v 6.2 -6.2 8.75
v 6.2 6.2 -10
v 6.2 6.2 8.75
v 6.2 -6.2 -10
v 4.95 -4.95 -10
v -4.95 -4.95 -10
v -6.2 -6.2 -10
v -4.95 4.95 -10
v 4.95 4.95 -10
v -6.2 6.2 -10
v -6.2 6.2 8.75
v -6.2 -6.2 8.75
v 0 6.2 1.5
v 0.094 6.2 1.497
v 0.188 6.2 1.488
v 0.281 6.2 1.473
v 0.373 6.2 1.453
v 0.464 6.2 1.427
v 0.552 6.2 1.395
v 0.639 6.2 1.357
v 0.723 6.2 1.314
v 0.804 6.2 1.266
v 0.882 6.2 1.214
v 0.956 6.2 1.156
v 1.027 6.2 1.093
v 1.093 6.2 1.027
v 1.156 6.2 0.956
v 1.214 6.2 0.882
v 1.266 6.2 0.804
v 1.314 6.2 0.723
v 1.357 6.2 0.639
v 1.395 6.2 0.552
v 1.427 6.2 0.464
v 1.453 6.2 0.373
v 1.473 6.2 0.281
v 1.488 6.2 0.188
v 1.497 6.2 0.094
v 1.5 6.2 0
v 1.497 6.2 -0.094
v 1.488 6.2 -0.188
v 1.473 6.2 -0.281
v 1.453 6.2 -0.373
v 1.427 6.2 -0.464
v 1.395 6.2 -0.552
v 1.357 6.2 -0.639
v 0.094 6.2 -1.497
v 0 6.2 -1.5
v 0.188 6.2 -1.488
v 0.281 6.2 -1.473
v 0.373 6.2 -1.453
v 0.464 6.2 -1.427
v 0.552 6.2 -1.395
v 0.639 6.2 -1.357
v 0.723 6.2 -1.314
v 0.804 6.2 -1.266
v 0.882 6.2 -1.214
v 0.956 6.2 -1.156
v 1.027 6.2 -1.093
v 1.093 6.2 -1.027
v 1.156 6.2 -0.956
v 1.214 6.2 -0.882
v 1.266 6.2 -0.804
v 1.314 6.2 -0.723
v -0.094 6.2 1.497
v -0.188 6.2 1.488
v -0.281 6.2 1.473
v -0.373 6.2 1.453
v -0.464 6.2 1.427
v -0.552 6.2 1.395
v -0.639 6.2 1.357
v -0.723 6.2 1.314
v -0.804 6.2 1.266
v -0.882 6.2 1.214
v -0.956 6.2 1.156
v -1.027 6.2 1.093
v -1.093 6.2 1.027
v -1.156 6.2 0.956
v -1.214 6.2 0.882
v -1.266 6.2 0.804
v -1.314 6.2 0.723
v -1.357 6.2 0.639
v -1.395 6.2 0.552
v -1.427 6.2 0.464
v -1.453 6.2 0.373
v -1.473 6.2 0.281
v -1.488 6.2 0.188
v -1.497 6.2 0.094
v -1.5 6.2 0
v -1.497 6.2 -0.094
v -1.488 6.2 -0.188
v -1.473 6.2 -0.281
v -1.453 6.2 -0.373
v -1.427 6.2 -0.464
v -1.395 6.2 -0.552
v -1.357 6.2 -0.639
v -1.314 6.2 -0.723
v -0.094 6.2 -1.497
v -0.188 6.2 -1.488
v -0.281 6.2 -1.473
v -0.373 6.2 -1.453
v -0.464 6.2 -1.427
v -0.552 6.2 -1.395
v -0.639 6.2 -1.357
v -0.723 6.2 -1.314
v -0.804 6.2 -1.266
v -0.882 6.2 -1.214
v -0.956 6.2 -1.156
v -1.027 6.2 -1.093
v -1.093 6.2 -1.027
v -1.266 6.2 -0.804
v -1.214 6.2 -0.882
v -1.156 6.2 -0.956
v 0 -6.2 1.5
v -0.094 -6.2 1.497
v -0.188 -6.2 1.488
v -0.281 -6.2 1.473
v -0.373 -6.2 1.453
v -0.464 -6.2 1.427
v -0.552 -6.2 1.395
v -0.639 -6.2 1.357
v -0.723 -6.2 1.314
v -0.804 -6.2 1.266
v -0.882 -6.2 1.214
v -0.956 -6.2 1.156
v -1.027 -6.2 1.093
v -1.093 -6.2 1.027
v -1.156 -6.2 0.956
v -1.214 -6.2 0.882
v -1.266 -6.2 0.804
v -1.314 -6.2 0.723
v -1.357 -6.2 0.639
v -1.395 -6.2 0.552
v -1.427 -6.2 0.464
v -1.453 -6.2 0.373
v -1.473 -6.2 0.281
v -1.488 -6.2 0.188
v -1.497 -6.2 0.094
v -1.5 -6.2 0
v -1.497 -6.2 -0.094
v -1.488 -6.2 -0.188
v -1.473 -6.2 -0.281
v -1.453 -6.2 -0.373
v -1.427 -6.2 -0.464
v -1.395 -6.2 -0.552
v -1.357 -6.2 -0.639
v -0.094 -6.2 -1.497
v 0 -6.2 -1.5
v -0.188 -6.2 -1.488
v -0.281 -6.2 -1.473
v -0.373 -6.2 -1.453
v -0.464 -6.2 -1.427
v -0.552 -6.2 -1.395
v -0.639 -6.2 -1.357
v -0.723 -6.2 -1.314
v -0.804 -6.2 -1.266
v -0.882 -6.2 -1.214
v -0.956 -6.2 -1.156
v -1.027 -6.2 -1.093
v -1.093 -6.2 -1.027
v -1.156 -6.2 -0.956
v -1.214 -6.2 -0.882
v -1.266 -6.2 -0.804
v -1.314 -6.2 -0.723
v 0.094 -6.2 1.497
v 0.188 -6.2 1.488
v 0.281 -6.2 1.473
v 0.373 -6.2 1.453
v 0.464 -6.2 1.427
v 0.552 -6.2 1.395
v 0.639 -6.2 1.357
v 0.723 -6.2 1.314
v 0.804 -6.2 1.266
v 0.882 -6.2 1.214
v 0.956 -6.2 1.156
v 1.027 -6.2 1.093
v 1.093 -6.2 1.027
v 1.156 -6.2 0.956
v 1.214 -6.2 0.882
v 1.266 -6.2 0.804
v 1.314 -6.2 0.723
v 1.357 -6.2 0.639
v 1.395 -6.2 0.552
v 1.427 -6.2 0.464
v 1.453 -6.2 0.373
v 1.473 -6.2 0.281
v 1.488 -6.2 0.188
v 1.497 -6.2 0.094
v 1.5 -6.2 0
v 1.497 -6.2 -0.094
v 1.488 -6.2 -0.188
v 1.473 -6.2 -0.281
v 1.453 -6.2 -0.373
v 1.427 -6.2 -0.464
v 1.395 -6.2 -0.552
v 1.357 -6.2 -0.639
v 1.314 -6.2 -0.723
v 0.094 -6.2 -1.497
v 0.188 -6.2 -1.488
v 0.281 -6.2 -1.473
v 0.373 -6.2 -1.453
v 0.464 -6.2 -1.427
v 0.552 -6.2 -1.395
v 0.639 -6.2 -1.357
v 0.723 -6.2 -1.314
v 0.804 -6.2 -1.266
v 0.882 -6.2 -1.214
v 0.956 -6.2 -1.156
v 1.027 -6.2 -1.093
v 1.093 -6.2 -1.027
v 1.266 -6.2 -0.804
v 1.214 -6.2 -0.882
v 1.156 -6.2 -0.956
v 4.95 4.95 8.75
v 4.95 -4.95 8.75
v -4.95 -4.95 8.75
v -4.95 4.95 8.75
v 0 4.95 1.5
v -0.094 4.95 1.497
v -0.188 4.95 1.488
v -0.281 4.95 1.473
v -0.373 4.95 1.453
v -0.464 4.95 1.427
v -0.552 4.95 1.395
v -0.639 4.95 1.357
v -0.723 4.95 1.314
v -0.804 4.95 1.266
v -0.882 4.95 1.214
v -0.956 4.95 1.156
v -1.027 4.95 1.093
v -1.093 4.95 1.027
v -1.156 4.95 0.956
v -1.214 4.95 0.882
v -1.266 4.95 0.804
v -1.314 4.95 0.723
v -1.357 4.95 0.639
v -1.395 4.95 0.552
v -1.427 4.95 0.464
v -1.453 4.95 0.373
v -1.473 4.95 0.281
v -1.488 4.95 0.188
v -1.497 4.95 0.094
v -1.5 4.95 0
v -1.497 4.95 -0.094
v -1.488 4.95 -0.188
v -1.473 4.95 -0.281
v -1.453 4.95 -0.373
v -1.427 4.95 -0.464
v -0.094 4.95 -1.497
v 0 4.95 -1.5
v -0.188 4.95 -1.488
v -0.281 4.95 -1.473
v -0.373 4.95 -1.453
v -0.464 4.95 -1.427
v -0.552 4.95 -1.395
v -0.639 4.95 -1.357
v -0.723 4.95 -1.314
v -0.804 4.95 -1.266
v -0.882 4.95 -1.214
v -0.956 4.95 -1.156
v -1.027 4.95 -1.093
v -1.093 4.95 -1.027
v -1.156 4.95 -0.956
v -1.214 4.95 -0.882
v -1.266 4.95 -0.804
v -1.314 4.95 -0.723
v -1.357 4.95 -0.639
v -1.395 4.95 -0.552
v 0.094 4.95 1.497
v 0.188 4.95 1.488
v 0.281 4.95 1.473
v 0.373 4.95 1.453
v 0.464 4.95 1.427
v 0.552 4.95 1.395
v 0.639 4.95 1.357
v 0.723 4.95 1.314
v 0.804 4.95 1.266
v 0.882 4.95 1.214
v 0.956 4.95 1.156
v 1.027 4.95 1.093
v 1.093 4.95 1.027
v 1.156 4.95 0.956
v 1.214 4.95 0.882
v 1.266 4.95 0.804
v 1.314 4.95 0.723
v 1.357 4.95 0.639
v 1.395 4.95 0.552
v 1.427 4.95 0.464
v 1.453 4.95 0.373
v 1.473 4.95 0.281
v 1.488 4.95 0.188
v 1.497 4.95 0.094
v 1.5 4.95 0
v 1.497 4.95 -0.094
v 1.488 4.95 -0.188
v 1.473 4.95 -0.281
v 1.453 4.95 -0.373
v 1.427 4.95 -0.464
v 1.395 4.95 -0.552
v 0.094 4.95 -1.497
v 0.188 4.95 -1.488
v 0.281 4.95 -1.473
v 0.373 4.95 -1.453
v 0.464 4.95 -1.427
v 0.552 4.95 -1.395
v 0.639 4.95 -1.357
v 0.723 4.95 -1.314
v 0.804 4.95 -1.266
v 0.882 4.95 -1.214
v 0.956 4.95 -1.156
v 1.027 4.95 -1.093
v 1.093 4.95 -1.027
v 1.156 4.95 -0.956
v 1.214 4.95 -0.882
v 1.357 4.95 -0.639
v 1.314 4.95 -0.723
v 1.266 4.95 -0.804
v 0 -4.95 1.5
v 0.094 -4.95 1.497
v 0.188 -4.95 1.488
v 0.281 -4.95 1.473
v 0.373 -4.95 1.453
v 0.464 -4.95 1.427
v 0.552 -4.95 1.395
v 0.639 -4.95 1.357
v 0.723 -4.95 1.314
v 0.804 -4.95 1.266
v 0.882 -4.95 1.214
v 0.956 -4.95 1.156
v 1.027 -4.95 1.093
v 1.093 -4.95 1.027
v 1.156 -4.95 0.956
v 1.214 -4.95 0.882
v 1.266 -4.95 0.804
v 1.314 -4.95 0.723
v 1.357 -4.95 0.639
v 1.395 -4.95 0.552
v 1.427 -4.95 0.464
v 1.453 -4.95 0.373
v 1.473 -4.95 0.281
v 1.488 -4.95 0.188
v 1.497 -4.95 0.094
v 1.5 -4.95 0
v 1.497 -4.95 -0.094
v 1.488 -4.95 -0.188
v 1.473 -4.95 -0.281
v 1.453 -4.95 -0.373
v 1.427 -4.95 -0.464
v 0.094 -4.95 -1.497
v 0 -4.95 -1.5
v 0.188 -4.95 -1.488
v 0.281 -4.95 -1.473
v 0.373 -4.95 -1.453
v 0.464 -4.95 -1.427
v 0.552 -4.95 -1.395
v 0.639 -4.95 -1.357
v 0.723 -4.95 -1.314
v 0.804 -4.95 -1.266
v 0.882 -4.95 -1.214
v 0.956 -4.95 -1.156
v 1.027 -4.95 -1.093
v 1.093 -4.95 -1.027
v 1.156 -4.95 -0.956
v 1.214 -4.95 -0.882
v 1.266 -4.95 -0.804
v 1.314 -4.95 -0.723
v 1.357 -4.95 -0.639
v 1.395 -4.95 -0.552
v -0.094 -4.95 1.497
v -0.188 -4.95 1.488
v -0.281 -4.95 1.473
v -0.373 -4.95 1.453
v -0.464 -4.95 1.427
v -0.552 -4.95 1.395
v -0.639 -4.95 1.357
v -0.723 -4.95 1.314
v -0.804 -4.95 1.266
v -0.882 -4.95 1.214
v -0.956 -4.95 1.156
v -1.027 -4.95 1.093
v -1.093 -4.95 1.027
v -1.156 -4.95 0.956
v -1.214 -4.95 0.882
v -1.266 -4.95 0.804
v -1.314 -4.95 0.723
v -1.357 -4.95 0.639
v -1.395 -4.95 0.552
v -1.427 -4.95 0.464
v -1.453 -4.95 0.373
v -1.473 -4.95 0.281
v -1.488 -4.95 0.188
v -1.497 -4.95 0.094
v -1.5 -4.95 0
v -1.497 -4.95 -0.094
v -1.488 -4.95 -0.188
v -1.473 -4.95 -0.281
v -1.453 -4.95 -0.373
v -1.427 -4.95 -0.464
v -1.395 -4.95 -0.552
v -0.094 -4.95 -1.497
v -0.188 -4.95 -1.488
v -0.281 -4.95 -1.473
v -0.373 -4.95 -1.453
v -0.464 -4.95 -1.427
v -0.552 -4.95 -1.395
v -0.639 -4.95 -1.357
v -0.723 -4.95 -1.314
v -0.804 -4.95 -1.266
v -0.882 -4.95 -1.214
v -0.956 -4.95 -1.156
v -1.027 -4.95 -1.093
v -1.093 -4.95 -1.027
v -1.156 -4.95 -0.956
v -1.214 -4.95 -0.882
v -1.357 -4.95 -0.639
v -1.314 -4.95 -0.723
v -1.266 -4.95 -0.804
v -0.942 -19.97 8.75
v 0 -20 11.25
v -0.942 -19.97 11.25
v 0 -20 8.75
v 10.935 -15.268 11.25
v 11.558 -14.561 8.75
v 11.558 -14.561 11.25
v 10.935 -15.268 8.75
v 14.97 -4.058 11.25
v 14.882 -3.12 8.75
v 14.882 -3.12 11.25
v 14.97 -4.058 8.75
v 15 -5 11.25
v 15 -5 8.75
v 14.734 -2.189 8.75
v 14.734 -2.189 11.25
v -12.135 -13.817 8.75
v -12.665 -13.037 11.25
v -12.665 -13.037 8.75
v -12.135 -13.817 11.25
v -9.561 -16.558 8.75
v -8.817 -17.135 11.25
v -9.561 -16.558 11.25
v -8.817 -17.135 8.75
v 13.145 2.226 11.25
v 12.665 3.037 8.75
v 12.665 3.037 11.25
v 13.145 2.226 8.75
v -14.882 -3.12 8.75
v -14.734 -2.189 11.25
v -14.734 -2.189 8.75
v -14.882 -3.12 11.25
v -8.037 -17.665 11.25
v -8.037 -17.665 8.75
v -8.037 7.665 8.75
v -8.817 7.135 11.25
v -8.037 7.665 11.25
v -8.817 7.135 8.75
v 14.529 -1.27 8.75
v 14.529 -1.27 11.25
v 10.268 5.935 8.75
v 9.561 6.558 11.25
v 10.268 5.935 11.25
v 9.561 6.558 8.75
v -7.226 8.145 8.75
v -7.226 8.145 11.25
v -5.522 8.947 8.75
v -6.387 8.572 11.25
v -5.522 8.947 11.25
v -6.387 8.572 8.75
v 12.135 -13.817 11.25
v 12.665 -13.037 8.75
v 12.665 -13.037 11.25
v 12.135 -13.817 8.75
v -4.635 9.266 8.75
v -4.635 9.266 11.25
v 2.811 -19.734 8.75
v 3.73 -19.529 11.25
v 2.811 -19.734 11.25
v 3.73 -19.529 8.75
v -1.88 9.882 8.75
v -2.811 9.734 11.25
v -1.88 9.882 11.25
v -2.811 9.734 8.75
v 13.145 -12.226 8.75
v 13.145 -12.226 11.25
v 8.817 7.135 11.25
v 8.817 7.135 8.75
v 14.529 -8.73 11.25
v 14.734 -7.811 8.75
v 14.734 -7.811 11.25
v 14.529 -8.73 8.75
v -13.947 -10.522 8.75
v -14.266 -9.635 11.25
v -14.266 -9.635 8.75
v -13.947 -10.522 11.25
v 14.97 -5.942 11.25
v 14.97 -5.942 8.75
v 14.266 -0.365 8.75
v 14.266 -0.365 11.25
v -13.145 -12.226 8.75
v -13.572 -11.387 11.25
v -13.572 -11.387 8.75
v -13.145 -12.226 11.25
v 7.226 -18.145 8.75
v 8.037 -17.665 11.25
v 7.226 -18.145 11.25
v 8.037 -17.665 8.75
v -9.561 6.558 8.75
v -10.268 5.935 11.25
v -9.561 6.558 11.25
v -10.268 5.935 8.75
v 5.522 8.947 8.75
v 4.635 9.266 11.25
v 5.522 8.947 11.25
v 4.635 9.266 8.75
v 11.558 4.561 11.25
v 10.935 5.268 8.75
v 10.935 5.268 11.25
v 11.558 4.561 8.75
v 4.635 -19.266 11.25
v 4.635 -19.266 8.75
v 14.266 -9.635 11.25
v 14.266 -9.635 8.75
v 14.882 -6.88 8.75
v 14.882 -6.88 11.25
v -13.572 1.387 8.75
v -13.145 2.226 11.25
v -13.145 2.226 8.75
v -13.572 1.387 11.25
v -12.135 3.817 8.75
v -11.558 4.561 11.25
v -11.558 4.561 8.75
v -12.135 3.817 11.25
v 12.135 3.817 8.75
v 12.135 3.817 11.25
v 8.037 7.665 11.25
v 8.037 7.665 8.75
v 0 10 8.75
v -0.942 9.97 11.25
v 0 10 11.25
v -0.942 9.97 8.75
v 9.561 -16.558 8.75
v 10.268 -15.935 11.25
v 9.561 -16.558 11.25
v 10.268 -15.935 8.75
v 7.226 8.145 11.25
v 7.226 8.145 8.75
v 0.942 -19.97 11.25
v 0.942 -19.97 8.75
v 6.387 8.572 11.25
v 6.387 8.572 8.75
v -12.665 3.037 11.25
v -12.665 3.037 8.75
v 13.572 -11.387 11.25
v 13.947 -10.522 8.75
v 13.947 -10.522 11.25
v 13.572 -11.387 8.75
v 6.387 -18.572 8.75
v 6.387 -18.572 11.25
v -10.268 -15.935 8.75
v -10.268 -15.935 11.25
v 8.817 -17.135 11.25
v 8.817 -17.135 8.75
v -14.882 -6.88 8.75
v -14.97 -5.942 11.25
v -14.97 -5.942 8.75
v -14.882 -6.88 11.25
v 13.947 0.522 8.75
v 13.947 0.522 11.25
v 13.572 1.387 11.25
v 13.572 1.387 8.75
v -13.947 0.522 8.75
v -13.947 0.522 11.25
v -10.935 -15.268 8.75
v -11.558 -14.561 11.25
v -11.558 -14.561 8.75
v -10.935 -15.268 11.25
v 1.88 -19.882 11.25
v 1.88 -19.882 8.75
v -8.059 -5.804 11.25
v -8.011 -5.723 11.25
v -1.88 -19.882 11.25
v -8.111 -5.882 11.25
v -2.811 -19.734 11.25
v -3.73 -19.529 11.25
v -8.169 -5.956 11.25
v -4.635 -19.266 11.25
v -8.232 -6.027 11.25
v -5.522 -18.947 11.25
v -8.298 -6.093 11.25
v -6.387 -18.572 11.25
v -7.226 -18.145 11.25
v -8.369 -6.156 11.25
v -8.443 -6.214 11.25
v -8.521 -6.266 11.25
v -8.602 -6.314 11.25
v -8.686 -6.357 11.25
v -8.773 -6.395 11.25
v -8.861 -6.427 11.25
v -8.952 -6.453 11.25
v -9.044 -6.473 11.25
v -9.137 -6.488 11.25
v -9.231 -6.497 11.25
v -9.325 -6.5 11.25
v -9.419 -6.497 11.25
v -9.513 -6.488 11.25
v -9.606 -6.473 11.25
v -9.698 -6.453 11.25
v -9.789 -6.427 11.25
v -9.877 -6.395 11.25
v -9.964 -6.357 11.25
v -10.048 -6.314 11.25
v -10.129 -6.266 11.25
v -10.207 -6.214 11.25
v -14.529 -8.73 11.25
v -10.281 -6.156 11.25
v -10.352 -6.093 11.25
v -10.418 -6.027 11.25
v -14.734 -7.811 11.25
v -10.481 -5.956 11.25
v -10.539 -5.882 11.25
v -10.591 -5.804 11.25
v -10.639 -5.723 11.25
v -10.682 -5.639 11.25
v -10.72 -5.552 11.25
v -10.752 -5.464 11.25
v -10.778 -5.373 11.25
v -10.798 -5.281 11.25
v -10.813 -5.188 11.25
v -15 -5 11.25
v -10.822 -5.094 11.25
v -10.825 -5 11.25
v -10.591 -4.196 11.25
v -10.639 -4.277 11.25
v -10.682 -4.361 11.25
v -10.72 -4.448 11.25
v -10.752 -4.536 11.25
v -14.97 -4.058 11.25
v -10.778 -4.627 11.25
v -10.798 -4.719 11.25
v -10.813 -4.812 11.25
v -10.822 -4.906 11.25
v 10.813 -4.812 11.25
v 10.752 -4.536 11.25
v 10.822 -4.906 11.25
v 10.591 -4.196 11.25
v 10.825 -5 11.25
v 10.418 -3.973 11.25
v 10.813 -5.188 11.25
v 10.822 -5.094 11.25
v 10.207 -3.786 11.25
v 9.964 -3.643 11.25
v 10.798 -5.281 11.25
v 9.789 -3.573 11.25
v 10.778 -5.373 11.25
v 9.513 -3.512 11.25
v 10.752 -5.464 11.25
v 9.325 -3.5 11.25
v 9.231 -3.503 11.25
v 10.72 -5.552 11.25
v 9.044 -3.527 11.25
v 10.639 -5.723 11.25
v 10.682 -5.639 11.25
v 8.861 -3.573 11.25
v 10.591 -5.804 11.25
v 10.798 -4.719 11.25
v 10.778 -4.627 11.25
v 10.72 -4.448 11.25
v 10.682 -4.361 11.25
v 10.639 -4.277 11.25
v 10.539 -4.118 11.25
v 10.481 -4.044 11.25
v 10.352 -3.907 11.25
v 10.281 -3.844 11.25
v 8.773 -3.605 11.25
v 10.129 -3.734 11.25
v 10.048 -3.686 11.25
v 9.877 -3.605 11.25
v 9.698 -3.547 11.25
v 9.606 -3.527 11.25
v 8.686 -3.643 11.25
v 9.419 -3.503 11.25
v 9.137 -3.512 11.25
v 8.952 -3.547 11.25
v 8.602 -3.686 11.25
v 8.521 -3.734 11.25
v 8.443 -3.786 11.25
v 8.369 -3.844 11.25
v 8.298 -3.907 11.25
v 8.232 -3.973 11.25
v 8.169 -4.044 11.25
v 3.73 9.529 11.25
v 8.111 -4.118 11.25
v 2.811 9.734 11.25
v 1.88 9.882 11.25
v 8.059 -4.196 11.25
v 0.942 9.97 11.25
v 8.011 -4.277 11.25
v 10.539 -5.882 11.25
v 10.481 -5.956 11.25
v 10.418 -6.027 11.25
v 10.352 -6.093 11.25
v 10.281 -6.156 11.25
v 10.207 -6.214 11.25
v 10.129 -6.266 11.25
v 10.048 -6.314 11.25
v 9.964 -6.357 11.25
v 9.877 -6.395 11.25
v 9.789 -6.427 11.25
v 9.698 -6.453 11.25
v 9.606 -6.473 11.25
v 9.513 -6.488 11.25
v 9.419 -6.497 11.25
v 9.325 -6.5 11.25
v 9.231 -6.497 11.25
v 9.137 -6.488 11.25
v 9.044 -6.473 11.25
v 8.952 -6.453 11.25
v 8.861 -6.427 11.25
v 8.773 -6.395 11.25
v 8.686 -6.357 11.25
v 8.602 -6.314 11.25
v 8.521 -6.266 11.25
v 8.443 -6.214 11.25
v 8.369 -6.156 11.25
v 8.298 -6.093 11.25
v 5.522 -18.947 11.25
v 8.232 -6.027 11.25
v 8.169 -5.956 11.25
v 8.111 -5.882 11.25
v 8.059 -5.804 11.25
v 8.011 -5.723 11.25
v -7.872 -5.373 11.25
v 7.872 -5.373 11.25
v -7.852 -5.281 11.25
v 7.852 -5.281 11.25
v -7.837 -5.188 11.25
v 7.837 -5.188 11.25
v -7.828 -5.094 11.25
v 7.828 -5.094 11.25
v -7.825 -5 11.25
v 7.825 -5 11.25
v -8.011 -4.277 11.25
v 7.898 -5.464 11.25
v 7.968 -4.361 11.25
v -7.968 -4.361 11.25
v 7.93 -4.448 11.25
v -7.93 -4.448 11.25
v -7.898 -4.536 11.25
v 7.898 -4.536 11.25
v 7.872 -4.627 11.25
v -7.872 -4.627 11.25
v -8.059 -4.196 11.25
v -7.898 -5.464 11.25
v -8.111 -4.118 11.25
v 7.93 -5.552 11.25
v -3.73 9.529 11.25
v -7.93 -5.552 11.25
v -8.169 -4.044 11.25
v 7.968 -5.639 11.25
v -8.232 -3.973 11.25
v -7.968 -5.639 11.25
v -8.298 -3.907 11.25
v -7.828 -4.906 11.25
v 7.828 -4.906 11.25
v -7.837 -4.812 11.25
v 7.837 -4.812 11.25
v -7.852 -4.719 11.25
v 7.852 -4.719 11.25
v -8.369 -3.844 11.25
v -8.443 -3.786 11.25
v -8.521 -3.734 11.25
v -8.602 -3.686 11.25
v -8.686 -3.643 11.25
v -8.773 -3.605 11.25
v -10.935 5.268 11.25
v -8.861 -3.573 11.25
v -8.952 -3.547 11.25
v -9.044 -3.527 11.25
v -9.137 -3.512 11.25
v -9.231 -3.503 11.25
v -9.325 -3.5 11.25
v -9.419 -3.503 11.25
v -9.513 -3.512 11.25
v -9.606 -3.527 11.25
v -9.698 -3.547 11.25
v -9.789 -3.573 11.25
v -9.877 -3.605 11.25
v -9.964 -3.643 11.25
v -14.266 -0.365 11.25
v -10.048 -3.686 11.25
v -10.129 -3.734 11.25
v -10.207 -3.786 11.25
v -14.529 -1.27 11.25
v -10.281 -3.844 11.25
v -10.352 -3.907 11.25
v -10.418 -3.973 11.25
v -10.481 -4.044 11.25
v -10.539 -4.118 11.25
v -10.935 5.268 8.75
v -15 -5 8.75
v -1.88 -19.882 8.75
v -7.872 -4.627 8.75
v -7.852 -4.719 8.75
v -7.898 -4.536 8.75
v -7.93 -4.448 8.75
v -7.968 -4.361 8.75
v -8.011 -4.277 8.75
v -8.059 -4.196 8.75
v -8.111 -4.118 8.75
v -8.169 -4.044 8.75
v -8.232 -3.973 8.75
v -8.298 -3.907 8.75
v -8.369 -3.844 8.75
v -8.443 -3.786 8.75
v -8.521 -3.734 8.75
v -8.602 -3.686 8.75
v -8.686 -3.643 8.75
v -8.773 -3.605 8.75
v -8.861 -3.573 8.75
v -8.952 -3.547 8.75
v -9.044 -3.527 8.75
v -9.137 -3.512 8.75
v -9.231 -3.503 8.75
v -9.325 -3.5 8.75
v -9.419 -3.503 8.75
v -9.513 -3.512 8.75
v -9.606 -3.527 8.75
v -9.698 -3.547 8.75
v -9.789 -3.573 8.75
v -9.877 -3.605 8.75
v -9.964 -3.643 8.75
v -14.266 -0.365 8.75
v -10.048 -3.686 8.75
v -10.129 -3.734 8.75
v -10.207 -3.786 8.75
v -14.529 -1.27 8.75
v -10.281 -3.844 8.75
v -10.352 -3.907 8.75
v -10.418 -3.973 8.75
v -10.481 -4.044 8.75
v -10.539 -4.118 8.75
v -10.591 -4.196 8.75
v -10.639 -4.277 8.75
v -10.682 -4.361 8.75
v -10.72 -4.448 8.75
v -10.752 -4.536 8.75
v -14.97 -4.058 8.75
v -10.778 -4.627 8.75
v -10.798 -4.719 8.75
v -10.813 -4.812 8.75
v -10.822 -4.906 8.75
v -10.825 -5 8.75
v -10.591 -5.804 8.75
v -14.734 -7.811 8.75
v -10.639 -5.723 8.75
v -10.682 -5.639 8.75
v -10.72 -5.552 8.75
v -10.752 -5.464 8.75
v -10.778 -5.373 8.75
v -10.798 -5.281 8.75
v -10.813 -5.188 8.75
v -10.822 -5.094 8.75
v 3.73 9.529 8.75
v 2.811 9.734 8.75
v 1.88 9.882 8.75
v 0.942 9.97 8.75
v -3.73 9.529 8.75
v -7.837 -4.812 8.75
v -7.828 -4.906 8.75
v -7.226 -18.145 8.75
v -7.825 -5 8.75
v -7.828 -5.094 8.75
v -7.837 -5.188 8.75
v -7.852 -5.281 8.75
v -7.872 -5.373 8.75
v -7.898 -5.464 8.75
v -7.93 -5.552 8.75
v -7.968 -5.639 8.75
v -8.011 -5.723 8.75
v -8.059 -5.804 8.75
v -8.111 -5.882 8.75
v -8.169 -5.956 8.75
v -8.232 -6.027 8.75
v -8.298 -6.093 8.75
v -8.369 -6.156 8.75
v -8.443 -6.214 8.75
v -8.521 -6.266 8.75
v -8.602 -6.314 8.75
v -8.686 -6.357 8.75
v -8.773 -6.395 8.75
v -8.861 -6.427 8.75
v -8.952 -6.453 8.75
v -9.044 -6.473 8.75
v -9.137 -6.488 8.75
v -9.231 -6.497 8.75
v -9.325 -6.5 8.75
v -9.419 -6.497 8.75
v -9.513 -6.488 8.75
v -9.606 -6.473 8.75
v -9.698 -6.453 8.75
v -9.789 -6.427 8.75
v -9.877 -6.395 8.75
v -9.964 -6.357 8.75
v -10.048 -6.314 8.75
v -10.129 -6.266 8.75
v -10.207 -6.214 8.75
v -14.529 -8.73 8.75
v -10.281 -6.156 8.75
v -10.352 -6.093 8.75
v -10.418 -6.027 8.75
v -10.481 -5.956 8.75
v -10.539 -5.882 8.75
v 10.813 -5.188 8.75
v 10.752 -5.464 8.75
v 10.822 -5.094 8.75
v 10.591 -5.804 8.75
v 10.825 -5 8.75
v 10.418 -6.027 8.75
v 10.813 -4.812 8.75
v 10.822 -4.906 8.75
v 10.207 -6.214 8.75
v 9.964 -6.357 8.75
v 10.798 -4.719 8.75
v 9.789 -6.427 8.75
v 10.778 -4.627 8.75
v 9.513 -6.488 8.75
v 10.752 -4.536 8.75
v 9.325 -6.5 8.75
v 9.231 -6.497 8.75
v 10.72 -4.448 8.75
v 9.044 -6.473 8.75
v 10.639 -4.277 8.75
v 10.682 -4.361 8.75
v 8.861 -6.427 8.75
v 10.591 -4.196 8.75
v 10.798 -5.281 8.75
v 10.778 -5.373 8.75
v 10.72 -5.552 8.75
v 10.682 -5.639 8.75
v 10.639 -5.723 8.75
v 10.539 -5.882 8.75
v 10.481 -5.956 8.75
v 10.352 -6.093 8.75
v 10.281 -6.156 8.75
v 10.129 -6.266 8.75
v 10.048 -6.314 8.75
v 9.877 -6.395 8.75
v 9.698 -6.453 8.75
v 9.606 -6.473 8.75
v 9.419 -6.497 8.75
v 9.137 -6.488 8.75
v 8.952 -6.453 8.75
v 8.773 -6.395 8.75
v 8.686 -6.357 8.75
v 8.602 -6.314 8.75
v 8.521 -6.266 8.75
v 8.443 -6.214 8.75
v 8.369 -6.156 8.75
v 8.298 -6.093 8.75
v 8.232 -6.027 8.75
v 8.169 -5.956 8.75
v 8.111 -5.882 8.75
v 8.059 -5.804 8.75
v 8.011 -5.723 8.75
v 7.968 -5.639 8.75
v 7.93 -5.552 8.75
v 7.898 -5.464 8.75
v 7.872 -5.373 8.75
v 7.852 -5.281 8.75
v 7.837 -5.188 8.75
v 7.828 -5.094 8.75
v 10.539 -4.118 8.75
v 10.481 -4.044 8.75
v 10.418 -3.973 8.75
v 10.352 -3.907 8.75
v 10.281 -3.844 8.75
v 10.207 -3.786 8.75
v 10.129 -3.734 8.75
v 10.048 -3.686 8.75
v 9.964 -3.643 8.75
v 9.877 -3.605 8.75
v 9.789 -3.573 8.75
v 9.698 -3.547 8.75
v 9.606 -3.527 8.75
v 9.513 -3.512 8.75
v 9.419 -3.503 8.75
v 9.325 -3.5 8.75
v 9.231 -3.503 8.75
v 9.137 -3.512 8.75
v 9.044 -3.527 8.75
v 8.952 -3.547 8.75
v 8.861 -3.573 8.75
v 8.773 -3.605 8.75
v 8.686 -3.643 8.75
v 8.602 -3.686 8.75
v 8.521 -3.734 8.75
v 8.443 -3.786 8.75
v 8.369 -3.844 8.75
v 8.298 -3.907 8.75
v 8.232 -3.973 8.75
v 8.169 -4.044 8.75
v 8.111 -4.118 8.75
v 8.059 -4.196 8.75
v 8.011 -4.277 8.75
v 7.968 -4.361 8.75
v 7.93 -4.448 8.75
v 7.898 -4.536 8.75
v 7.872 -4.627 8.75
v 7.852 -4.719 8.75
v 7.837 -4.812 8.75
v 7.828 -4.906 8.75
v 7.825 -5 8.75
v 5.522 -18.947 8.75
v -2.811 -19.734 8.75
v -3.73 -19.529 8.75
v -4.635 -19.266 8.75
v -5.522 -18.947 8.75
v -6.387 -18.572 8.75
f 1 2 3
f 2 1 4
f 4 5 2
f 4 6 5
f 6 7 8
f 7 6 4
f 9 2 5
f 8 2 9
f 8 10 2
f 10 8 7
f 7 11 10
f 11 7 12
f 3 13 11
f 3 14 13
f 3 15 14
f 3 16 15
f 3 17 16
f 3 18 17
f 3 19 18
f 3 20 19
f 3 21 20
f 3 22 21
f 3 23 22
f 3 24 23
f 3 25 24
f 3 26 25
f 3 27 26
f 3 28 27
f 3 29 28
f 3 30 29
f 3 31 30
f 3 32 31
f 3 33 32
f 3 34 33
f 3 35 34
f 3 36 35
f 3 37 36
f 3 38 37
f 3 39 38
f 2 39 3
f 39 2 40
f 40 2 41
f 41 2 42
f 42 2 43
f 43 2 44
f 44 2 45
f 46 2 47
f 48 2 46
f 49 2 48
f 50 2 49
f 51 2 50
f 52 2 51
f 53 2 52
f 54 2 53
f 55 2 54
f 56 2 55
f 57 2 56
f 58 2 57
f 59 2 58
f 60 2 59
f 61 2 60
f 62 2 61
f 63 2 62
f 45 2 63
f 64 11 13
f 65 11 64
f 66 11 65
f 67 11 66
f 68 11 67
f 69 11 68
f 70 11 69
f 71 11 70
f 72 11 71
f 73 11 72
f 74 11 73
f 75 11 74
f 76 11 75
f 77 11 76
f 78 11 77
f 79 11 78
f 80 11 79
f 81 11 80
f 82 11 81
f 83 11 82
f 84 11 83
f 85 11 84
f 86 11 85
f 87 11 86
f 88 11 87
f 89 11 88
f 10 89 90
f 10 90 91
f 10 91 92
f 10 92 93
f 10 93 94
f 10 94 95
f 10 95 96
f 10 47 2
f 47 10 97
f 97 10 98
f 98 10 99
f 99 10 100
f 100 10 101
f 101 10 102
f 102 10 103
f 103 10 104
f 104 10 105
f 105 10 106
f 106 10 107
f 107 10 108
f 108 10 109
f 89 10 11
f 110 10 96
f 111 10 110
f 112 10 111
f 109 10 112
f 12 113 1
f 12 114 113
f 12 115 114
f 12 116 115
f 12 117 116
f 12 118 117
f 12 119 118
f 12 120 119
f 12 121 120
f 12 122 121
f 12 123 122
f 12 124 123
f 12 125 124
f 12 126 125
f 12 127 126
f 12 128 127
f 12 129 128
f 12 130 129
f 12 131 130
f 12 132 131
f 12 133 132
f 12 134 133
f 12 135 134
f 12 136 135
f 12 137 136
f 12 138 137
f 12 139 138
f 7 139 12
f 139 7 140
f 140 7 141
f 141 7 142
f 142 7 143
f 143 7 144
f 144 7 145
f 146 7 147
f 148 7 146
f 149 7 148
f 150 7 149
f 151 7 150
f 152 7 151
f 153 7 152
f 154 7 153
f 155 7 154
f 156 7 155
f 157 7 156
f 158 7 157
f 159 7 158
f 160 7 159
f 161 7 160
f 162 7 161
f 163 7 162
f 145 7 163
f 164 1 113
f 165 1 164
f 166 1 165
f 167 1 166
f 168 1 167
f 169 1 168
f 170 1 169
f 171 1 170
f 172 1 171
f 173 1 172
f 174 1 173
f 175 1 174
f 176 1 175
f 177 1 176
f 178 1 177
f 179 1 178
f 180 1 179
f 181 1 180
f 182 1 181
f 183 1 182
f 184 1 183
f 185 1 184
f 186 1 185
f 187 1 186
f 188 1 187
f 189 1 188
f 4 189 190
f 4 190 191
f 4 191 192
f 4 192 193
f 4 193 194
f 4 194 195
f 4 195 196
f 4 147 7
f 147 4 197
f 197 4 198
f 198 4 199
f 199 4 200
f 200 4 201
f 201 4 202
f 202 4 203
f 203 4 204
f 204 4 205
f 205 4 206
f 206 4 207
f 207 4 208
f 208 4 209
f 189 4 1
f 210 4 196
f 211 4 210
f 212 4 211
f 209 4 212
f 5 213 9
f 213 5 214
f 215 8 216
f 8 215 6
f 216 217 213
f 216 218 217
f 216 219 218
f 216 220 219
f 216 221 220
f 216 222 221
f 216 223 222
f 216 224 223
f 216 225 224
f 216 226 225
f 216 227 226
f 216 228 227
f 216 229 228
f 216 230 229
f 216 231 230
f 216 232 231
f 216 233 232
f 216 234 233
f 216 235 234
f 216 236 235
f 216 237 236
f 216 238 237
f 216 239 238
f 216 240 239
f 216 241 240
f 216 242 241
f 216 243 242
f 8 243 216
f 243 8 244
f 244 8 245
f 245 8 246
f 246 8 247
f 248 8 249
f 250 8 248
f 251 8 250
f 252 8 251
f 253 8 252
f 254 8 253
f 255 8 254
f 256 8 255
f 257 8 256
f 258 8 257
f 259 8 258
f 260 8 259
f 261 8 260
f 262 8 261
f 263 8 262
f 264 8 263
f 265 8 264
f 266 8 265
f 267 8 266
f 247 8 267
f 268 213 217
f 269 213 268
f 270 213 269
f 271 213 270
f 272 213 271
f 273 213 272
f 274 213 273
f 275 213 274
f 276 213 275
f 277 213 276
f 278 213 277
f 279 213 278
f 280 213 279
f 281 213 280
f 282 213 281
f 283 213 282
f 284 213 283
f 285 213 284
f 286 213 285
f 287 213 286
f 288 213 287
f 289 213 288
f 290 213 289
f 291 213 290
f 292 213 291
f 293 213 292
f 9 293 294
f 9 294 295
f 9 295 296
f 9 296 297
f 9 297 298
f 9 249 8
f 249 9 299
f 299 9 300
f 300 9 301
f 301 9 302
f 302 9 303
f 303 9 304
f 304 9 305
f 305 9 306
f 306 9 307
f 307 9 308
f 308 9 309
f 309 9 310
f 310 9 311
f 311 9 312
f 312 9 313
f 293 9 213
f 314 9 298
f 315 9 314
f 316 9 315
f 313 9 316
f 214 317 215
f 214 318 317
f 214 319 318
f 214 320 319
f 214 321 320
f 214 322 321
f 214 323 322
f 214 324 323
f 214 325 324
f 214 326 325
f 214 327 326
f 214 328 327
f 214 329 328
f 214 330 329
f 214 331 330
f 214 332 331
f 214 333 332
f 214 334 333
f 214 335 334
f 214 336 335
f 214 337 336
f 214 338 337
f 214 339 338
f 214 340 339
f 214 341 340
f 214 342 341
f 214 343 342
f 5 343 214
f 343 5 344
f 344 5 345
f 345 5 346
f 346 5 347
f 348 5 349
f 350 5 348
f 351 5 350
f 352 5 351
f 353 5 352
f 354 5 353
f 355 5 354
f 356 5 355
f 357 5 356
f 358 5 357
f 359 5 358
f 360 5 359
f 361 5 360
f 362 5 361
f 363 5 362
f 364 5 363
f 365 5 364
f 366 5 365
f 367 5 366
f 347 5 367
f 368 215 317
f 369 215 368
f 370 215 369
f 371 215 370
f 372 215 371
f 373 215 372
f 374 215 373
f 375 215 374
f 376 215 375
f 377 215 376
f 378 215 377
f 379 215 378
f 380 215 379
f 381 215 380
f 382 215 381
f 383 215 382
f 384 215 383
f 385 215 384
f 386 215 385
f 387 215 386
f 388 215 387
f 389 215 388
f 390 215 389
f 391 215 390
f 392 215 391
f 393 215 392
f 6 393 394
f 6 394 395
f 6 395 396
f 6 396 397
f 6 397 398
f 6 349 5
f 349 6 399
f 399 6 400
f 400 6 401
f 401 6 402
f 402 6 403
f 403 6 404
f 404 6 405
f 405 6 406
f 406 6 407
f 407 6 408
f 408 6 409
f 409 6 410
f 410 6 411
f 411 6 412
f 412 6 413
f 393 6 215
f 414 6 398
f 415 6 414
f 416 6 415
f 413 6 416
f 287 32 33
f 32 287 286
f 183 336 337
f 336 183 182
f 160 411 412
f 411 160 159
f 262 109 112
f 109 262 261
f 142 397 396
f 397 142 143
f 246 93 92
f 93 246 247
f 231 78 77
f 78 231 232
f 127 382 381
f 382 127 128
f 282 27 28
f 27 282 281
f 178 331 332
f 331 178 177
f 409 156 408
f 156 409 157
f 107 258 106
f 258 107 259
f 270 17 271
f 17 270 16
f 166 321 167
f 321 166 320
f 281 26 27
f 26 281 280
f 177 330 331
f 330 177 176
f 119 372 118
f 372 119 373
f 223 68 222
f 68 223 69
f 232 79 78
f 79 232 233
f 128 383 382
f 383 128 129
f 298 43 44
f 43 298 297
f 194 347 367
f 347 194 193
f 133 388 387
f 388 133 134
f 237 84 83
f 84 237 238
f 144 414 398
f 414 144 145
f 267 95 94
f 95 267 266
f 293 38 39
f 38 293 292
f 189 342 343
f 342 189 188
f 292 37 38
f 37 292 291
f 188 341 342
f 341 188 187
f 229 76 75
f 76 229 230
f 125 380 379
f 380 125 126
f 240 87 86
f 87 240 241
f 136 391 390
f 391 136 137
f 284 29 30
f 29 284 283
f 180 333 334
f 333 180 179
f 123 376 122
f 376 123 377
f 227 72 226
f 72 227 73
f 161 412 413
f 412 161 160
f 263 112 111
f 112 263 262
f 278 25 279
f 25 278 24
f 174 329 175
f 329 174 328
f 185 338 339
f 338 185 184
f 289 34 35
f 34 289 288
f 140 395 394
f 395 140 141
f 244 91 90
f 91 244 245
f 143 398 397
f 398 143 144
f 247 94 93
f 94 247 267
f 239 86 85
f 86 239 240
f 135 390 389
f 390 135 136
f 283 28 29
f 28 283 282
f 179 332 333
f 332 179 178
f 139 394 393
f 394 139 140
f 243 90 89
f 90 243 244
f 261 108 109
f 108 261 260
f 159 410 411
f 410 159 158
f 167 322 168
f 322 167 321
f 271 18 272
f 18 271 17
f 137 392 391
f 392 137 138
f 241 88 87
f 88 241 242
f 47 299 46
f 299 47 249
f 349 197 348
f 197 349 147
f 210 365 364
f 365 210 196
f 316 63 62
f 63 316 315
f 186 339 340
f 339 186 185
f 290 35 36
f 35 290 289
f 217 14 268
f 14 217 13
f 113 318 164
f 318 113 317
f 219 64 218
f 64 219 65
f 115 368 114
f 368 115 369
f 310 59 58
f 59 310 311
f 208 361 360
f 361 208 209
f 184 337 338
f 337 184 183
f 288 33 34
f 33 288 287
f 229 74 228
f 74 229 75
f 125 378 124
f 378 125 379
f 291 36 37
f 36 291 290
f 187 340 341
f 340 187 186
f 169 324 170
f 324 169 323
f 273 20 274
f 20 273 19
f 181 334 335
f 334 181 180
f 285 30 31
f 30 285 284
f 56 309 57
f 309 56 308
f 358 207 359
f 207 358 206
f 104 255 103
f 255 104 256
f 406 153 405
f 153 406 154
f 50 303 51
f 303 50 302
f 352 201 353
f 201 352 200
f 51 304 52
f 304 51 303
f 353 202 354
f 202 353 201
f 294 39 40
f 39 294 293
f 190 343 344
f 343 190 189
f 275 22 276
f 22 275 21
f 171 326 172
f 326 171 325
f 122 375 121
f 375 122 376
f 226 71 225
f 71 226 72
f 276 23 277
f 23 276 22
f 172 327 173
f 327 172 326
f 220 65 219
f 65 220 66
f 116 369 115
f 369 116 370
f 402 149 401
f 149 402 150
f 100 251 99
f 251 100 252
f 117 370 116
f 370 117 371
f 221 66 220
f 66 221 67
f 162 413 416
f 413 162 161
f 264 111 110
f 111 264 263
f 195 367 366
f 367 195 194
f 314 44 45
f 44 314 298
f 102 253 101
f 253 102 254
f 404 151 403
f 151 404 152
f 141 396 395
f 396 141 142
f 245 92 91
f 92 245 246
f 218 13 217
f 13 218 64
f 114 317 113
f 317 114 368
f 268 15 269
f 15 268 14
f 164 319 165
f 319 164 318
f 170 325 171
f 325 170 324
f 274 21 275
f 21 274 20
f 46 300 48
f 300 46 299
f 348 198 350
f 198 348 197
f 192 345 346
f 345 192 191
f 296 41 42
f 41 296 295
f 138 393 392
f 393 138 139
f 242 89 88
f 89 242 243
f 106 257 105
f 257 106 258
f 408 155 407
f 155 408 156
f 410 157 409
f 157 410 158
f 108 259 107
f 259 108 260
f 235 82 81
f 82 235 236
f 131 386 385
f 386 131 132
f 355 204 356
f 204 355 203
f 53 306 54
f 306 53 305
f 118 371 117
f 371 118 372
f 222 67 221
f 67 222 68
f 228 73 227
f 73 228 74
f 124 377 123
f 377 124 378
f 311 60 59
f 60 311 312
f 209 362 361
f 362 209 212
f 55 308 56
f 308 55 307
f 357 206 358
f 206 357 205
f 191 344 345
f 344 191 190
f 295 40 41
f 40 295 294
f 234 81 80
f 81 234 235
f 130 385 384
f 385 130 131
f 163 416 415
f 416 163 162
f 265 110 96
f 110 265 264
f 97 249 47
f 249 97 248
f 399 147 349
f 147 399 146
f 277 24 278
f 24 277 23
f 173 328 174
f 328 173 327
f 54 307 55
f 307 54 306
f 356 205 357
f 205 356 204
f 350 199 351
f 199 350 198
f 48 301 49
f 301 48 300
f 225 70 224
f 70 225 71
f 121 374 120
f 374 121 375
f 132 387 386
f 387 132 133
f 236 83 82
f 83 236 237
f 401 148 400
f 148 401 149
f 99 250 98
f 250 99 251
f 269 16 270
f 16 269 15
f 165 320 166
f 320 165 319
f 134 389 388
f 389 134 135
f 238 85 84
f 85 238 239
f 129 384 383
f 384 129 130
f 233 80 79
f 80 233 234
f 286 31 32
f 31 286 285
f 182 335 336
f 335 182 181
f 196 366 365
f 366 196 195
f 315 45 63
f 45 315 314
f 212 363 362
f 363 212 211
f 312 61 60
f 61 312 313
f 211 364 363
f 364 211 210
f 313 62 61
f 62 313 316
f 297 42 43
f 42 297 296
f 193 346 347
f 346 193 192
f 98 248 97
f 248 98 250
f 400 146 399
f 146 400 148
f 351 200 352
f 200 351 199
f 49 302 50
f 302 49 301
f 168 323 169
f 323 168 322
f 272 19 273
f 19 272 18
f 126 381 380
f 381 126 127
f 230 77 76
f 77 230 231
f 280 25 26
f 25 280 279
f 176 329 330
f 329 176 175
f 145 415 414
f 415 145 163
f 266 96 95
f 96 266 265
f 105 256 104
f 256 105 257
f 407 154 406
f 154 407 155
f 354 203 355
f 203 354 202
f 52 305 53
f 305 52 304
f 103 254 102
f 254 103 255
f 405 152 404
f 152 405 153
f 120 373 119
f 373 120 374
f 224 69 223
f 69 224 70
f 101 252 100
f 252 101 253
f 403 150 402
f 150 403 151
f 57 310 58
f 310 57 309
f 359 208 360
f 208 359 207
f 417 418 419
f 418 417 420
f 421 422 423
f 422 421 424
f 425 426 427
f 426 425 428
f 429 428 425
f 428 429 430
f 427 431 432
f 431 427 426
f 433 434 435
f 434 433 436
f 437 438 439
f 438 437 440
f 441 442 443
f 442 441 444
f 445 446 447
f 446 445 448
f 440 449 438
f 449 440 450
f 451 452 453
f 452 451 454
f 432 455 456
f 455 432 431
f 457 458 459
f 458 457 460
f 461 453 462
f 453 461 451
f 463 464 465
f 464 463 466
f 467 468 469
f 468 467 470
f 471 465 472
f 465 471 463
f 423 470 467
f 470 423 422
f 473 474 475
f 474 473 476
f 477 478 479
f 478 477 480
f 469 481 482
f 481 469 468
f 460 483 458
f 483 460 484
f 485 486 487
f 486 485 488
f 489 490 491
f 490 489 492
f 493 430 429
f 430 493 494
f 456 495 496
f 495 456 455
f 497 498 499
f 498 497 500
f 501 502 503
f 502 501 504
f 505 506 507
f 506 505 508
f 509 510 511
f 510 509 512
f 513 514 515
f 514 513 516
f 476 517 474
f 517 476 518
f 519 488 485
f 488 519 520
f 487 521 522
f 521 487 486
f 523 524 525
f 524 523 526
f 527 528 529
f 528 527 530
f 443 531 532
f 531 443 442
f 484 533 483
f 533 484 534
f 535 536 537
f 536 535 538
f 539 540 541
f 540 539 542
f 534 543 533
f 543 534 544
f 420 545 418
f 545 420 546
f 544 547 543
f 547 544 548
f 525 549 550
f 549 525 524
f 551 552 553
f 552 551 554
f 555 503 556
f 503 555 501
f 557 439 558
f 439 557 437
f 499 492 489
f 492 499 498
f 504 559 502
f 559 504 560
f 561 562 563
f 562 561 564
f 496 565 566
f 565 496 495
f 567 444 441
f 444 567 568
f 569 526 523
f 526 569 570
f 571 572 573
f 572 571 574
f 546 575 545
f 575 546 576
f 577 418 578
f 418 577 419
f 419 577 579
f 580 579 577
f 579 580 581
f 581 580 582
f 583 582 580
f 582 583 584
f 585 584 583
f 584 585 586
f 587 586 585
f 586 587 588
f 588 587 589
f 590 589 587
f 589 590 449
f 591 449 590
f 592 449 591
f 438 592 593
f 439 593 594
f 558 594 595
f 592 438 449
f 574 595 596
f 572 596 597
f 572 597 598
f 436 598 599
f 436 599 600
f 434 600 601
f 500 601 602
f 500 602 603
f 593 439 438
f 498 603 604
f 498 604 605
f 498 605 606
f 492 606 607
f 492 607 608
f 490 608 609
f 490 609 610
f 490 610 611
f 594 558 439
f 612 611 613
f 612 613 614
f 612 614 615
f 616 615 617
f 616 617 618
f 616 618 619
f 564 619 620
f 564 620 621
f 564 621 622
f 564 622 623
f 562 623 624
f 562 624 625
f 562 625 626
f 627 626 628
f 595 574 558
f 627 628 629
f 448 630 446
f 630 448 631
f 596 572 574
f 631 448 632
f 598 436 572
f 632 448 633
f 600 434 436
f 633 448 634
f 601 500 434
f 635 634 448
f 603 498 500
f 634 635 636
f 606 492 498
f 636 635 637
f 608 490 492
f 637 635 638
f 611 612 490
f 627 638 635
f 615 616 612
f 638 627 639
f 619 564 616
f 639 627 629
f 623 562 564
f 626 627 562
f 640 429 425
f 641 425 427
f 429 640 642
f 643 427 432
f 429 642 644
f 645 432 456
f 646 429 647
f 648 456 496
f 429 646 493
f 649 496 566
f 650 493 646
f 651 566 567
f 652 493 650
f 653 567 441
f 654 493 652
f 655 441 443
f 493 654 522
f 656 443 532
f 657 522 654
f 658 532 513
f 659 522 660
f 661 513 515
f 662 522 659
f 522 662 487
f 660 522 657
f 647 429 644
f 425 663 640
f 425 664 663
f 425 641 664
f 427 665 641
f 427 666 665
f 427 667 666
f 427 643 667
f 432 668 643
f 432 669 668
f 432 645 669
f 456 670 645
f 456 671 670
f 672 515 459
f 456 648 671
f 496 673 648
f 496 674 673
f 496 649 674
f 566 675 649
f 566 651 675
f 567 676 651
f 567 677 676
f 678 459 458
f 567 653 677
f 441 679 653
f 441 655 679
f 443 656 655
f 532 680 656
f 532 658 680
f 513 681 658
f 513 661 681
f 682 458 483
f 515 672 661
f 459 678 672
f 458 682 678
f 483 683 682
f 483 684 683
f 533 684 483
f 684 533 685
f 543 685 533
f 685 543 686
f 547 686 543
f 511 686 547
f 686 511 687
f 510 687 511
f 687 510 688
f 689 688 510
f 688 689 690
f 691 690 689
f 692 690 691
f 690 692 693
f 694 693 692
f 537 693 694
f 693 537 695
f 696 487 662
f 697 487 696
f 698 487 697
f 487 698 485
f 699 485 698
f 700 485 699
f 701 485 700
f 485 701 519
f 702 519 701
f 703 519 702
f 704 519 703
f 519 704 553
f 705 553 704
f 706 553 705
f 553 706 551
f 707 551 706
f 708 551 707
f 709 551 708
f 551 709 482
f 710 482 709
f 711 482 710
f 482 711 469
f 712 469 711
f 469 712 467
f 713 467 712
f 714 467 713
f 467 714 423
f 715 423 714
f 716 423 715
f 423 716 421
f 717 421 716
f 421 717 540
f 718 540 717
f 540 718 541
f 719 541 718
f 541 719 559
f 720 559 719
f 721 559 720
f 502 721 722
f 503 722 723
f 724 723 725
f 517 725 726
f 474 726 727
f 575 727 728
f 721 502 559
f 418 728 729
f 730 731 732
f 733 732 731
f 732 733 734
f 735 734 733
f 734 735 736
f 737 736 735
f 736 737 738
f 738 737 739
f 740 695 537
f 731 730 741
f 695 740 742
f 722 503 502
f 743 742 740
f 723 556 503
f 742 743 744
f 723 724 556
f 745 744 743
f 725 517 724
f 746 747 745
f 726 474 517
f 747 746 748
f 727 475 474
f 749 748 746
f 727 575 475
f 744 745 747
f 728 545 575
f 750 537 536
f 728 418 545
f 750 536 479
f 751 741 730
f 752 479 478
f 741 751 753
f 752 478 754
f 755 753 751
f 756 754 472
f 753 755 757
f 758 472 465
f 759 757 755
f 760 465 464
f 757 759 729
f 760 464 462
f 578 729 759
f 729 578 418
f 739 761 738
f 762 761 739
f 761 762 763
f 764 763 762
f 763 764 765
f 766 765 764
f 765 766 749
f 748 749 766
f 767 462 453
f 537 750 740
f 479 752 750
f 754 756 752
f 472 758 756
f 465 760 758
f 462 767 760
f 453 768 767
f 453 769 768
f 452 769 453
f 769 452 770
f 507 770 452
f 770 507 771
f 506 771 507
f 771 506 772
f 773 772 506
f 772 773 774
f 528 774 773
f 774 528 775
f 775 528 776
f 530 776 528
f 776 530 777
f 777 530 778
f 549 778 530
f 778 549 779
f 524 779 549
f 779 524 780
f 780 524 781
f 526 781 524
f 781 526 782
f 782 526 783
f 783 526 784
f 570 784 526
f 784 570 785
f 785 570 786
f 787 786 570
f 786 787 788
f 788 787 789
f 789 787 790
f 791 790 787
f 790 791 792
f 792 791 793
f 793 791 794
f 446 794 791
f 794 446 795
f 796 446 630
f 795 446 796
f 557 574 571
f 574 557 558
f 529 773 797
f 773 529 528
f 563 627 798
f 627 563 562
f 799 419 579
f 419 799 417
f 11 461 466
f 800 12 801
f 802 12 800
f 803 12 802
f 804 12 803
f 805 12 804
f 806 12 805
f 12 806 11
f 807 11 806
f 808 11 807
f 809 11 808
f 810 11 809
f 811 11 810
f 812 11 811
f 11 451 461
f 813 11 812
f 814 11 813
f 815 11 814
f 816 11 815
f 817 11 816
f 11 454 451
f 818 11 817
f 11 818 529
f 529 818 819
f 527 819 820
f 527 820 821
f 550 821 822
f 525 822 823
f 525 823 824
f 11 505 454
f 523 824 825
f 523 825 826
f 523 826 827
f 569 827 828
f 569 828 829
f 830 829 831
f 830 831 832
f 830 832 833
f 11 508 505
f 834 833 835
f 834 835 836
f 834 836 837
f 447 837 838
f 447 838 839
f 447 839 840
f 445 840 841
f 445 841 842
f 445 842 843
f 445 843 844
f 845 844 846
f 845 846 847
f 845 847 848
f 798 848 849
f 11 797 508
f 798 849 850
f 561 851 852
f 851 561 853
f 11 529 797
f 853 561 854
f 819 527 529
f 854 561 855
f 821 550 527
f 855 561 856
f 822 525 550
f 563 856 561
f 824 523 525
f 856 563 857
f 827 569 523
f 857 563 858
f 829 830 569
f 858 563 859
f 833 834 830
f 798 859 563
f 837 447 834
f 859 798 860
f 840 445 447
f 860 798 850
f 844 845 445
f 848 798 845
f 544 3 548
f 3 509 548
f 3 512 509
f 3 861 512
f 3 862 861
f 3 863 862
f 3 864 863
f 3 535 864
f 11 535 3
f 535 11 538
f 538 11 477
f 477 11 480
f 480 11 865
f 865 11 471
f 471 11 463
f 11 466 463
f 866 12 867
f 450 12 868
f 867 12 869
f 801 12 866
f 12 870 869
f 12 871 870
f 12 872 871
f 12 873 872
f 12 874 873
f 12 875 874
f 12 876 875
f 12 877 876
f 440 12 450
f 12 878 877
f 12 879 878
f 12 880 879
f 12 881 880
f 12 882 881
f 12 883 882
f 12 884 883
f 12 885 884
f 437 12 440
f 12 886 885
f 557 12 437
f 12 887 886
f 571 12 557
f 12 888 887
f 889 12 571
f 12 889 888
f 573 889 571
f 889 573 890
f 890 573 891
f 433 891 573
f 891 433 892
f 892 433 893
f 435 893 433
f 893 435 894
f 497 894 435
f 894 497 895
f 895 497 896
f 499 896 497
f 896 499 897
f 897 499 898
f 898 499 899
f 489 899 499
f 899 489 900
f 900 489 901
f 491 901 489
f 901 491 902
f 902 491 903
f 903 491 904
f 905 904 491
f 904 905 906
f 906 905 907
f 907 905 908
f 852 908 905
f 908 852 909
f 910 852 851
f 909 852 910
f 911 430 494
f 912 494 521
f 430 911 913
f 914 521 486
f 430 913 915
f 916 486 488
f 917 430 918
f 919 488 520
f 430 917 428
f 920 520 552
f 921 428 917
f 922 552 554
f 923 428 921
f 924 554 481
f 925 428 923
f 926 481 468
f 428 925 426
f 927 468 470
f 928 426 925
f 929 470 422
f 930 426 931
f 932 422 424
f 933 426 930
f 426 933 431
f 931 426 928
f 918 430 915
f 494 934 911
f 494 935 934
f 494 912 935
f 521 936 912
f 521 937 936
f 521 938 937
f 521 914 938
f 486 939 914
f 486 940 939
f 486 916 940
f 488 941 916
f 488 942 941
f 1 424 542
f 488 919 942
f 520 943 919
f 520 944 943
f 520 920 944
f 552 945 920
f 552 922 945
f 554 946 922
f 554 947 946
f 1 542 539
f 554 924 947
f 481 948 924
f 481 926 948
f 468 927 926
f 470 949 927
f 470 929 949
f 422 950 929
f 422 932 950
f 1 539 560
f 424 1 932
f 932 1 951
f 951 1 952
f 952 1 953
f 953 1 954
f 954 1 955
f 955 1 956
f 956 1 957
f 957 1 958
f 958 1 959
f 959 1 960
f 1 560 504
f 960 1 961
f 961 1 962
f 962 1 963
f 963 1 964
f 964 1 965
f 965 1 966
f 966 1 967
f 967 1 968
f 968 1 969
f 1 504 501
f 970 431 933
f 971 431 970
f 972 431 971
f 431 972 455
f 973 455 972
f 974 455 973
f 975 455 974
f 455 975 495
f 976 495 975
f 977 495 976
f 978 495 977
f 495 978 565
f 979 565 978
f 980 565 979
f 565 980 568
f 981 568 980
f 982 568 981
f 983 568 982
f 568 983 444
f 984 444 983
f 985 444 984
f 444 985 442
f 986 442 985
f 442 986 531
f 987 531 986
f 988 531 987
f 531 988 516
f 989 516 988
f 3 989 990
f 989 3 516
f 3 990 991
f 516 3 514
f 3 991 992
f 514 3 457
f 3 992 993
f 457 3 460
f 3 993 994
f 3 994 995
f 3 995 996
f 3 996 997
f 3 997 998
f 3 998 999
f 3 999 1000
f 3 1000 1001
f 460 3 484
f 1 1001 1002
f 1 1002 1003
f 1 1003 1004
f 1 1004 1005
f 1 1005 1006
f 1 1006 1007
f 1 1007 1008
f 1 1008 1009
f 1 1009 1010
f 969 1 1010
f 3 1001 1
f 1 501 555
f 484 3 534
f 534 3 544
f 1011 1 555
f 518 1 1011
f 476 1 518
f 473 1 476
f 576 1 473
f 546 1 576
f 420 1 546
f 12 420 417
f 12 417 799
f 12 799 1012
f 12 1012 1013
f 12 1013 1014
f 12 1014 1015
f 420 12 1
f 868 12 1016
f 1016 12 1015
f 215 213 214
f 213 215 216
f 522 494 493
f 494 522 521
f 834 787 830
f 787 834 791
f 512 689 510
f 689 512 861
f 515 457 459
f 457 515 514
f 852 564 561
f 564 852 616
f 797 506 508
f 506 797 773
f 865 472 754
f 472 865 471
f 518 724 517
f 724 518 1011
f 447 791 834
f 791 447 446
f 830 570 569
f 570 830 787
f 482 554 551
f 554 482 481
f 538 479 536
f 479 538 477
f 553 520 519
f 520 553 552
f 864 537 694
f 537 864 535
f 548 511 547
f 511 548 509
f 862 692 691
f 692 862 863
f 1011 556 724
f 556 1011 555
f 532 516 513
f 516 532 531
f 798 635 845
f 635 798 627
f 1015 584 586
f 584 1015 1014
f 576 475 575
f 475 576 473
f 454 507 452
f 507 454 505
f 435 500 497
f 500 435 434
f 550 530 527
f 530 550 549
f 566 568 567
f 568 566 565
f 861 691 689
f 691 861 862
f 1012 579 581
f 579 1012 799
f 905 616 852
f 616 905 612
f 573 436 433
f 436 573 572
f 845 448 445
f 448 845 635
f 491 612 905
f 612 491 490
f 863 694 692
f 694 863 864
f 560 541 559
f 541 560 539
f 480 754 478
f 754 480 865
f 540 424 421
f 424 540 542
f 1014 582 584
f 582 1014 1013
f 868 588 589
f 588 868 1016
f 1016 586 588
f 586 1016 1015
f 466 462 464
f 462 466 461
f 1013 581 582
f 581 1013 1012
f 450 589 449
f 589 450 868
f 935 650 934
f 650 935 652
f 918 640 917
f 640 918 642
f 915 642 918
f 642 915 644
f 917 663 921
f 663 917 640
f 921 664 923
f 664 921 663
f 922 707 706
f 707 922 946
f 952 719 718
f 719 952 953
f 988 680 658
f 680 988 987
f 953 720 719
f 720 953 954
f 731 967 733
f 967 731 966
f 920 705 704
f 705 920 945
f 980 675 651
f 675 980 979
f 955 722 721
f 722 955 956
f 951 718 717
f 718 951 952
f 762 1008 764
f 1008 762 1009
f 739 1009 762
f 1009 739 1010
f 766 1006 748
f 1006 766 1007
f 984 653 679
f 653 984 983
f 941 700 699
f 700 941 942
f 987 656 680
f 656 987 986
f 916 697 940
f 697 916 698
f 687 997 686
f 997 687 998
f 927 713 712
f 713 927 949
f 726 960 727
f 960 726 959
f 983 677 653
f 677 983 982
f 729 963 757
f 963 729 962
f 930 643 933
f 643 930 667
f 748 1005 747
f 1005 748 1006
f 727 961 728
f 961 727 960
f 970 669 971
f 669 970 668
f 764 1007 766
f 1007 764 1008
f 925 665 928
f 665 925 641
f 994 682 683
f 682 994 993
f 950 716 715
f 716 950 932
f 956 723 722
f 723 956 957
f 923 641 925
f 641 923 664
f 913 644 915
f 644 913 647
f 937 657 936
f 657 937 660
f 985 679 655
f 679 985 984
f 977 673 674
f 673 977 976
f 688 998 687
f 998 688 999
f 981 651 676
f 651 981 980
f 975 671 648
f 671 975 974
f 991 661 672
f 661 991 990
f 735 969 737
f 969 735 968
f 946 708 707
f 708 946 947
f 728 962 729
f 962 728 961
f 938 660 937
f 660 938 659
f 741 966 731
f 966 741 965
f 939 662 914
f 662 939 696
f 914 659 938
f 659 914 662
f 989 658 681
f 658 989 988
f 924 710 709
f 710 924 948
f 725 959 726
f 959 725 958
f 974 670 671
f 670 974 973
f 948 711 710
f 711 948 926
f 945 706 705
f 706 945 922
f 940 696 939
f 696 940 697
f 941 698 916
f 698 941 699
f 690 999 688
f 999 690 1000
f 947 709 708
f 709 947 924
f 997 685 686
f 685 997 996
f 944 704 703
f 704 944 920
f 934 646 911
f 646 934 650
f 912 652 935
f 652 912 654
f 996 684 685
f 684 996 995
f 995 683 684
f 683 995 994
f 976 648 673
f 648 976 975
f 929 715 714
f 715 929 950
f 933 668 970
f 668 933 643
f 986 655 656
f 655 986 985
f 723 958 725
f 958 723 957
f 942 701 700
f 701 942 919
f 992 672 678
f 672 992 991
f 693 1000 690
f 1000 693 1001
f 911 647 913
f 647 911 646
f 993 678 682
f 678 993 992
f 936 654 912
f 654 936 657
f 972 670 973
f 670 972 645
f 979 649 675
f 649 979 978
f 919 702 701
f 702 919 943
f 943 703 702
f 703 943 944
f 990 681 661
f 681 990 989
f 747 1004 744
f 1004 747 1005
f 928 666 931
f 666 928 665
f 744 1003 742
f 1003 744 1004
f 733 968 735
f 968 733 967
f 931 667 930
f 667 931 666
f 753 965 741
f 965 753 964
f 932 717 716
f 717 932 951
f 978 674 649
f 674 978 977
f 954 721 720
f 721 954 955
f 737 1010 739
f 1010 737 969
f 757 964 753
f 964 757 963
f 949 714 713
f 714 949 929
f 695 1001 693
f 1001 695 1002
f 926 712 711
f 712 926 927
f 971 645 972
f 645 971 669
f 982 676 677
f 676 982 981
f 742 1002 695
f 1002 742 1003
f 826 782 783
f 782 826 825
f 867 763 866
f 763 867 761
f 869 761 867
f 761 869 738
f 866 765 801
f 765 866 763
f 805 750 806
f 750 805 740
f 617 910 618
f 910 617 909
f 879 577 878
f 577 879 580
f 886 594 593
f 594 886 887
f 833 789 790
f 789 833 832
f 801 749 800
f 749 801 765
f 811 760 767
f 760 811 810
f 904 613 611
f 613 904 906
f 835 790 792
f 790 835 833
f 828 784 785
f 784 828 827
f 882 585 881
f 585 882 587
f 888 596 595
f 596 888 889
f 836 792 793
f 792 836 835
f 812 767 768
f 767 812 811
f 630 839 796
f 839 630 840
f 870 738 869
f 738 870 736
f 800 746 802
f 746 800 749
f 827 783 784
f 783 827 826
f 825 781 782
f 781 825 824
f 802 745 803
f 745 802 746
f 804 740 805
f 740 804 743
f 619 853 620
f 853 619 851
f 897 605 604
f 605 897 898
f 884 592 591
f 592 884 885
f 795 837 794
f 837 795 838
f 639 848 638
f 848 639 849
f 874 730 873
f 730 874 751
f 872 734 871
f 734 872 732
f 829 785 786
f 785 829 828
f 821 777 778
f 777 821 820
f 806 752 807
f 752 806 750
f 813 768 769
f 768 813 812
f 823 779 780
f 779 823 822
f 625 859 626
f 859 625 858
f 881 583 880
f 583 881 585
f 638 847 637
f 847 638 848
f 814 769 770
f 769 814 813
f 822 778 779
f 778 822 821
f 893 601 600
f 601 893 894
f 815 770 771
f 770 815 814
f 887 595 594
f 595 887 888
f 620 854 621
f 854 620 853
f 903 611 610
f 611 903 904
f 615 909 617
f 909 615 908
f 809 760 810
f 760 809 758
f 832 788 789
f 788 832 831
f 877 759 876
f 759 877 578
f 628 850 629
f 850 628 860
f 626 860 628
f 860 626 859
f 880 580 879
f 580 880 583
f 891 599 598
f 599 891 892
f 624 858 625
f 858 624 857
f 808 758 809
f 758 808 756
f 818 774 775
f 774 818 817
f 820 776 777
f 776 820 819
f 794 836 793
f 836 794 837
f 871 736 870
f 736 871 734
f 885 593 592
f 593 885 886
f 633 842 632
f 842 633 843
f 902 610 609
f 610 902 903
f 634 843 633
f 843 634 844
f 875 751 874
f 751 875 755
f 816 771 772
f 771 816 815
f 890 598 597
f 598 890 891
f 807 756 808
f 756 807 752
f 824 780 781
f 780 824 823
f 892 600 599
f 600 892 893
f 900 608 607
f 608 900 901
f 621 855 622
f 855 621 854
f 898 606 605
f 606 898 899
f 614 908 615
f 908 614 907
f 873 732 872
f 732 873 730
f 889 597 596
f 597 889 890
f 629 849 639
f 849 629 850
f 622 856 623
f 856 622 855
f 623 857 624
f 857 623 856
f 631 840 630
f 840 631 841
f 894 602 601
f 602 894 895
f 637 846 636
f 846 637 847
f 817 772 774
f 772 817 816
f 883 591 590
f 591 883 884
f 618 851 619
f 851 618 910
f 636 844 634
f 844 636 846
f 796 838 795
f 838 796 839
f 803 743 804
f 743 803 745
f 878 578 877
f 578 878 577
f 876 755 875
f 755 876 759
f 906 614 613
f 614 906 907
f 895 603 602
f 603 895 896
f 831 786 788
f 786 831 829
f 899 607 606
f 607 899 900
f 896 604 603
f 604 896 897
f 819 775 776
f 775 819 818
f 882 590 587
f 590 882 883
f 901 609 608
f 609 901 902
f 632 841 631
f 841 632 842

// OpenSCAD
wall = 1.25;
id = 9.9;
od = id + (2*wall);
length = 20;
$fn = 100;

mount_space = 18.65;	//distance between motor mount holes.

difference(){
	cube([od,od,length],center=true);
	cube([id,id,length],center=true);
	rotate([90,0,0]){
		cylinder(h=od, r=1.5, center=true);
	}
}

translate([0,-5,(15+length)/2]){
	//difference(){
	//	cylinder(h=15, r=12.5+(2*wall), center=true);
	//	cylinder(h=15, r=12.5, center=true);
	//}

	difference(){
		translate([0,0,-15/2]){
			cylinder(h=2*wall, r=12.5+(2*wall), center=true);
		}
		translate([mount_space/2,0,-15/2]){
			cylinder(h=2*wall, r=1.5, center=true);
		}
		translate([-mount_space/2,0,-15/2]){
			cylinder(h=2*wall, r=1.5, center=true);
		}
	}
	
}
